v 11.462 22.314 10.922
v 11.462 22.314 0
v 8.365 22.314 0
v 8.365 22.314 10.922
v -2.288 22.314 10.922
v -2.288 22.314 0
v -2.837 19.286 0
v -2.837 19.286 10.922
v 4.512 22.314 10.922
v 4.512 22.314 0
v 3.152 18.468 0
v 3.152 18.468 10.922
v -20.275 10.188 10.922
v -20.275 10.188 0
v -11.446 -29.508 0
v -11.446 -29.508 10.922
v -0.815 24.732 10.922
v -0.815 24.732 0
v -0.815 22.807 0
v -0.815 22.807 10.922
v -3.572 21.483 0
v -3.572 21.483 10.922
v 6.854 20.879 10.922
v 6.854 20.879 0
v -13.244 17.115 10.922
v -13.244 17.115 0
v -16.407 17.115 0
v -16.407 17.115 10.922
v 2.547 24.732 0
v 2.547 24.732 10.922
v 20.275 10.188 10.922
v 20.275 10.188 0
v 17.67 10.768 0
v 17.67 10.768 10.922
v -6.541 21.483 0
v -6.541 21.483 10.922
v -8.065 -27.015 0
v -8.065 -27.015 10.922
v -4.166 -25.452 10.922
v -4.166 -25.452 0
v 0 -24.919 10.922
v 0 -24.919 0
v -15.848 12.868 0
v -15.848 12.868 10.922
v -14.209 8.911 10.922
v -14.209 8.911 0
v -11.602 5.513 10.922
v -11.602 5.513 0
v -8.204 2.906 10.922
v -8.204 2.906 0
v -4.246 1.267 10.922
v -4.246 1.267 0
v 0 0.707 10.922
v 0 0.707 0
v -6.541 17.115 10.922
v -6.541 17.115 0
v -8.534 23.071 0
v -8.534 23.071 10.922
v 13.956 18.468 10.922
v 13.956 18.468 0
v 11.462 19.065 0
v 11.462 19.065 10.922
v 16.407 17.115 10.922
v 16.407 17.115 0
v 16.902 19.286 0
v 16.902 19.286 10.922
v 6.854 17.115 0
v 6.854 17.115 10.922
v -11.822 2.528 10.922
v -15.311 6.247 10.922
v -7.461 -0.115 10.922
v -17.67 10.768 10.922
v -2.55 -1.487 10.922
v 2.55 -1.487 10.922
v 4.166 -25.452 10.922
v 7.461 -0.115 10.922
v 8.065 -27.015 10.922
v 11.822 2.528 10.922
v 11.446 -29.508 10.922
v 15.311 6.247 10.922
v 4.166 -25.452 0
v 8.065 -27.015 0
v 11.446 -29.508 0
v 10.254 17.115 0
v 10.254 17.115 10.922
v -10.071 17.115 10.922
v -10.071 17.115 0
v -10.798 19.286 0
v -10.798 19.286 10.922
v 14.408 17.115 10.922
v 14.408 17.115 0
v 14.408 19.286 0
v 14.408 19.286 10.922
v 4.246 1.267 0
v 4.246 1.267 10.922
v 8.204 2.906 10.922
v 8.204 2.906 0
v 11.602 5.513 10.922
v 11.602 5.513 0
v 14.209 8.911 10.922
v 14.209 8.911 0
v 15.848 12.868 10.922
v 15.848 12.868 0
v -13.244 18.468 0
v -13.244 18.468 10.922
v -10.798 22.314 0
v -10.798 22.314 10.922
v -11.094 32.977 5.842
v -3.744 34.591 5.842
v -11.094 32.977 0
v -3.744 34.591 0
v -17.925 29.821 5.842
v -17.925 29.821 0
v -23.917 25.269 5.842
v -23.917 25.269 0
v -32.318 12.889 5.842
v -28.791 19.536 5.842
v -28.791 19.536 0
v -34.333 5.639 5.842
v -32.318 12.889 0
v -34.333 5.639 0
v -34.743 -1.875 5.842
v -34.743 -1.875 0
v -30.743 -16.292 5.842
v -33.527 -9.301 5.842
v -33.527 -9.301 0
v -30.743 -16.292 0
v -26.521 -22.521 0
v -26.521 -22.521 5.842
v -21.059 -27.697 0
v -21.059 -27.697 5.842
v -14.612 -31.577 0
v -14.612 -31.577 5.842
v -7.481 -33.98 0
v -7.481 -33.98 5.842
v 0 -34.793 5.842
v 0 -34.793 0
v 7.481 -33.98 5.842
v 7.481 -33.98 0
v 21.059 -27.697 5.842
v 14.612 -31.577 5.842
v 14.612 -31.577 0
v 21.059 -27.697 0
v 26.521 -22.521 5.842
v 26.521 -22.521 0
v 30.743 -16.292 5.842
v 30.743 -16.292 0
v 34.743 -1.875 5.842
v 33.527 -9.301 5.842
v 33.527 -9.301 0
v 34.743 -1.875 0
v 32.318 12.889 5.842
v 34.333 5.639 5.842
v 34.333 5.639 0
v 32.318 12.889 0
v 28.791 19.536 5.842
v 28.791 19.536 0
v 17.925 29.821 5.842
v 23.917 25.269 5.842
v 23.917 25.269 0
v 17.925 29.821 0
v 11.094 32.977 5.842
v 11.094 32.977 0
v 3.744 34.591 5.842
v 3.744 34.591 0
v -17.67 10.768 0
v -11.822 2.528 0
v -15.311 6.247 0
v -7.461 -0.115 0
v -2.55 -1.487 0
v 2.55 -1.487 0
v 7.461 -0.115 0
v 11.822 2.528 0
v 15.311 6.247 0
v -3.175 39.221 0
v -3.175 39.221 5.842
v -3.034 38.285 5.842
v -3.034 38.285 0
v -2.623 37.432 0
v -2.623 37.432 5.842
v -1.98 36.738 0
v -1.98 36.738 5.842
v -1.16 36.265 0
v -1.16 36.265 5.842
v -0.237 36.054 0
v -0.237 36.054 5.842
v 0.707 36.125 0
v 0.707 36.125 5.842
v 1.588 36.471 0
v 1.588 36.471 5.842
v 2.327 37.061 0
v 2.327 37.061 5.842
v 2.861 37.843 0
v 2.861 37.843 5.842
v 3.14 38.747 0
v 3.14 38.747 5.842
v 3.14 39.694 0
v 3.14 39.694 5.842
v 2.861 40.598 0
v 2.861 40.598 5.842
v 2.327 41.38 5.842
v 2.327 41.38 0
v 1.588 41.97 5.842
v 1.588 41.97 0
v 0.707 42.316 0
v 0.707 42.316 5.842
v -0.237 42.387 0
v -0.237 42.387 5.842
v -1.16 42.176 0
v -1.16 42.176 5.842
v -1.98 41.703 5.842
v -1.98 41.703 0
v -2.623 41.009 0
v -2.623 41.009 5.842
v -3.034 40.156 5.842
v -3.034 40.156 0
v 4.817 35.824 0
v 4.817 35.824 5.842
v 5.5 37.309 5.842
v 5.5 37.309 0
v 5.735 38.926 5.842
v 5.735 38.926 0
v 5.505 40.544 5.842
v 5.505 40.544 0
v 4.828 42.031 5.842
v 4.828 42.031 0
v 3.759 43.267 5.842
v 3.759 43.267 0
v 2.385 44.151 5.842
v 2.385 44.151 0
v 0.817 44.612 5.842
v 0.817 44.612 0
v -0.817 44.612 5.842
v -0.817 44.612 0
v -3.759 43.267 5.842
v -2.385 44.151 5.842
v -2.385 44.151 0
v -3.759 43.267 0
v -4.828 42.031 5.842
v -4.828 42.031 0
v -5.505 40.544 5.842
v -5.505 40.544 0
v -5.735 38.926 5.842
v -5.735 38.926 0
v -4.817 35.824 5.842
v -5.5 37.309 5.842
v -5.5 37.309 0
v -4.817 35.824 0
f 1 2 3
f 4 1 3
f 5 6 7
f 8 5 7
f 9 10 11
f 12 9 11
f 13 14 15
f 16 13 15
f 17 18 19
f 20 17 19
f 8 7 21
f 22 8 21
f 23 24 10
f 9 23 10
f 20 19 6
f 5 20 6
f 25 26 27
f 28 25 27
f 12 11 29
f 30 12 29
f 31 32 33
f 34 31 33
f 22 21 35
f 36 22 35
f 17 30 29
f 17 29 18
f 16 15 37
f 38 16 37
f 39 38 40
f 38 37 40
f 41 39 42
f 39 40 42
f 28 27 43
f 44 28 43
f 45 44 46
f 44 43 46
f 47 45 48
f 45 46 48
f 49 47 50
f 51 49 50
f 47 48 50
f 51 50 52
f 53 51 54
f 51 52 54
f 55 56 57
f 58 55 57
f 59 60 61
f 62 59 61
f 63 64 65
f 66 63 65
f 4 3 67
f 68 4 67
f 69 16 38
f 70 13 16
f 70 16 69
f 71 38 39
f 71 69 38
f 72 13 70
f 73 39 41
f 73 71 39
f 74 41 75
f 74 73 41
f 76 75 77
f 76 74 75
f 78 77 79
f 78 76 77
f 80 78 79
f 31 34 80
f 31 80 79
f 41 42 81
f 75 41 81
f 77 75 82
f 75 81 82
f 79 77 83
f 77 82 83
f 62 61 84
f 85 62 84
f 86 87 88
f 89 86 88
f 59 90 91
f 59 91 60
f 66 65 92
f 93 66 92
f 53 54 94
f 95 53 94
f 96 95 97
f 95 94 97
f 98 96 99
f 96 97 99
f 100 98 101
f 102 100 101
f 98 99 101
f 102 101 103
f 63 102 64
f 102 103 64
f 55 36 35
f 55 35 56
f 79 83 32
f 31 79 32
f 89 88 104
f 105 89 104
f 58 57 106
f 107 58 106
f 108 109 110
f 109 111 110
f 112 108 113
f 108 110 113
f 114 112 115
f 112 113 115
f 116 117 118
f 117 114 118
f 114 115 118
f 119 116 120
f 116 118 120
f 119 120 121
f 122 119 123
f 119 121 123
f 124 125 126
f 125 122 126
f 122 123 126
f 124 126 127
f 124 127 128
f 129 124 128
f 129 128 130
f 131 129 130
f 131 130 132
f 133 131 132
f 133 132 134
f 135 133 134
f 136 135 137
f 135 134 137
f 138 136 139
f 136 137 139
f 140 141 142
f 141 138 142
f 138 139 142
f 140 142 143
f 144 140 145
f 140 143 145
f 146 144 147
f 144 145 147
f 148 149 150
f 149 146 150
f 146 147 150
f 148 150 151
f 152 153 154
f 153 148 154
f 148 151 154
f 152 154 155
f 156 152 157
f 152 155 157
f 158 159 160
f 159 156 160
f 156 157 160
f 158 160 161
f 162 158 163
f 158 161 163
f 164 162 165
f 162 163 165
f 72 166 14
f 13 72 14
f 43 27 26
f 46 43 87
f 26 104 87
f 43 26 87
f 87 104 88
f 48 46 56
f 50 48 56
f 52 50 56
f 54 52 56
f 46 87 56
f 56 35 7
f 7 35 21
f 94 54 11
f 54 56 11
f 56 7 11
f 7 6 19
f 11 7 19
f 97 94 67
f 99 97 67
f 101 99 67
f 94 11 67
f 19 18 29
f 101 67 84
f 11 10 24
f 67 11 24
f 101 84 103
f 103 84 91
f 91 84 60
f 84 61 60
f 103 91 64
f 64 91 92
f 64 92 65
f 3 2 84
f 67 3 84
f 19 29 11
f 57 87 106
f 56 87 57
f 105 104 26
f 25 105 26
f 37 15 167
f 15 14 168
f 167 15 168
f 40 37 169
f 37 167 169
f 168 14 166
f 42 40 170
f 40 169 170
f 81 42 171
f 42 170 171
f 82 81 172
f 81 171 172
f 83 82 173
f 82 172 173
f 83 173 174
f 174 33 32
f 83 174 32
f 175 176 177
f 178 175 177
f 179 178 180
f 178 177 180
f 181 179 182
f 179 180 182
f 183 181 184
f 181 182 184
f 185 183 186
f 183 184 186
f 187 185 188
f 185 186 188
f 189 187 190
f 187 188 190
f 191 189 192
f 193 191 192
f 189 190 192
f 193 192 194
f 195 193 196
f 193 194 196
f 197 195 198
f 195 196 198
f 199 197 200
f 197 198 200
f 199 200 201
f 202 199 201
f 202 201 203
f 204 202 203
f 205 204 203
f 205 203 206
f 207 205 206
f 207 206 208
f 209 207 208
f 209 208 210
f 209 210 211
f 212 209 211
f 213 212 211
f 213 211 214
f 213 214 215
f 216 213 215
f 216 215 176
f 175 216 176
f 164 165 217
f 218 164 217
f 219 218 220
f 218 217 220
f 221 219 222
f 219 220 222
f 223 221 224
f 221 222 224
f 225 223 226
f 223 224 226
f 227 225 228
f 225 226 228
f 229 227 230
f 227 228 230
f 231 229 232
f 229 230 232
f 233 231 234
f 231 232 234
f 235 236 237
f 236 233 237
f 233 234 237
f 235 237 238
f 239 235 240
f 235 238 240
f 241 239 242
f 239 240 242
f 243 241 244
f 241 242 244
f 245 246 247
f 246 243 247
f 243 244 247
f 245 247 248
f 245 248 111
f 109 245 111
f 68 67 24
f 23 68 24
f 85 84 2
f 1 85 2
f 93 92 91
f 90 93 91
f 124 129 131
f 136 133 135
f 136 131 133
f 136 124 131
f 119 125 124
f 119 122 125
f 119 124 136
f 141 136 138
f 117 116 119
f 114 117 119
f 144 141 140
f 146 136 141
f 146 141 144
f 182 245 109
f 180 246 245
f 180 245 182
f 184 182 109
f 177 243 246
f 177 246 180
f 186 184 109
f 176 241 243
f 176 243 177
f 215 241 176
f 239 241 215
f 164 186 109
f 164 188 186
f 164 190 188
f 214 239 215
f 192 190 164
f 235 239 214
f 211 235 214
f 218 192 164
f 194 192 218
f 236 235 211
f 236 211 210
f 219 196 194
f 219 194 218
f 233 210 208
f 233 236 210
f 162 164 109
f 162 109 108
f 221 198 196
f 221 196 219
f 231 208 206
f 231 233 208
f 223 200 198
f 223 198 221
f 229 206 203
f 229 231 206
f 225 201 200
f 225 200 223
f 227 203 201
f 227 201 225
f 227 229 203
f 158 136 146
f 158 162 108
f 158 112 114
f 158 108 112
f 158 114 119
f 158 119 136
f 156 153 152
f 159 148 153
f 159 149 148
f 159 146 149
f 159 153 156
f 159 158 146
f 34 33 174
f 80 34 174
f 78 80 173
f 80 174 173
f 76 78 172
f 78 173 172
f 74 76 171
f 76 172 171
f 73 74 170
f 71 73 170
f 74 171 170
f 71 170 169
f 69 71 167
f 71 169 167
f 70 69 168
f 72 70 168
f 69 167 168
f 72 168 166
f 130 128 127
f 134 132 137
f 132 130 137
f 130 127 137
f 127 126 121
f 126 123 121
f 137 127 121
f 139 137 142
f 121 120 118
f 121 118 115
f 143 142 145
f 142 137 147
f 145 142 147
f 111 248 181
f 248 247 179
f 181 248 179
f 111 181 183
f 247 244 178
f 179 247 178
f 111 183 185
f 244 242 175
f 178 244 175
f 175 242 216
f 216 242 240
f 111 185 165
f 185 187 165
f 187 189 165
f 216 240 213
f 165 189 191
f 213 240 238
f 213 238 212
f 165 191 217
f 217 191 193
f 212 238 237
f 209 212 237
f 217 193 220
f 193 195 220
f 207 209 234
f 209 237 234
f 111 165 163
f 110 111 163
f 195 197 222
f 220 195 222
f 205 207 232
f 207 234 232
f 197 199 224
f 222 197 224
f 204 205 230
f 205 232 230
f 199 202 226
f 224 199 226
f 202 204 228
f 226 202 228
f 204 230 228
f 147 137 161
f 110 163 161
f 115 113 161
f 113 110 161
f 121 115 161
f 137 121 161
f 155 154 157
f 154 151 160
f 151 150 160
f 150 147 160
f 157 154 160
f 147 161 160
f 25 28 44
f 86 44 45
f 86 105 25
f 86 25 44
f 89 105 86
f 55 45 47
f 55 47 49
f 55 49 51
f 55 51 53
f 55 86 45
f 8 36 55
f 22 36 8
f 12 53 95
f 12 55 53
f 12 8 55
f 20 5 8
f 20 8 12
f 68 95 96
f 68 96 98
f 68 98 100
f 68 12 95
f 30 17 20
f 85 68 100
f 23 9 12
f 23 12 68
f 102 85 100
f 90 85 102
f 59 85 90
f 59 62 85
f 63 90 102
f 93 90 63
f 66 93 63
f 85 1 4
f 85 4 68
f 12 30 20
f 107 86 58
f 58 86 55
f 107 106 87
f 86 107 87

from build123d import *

# Parameters (mm, degrees)
F1_DEPTH = 10.922
F2_R     = 34.7934132073
F3_DEPTH = 5.842
F4_R     = 5.7350404731
F6_DEPTH = 5.842
F8_D     = 6.35


with BuildPart() as f1:
    # F0 (on Top) → F1 (new body)
    with BuildSketch(Plane.XY):
        with BuildLine():
            ThreePointArc((-16.4070340013, 17.1145107597), (-11.6015250015, 5.5129857582), (0, 0.7074767584))
            ThreePointArc((0, 0.7074767584), (11.6015250015, 5.5129857582), (16.4070340013, 17.1145107597))
            Line((16.4070340013, 17.1145107597), (16.9020351022, 19.2860950854))
            Line((16.9020351022, 19.2860950854), (14.4083536053, 19.2860950854))
            Line((14.4083536053, 19.2860950854), (14.4083536053, 17.1145107597))
            Line((14.4083536053, 17.1145107597), (13.9555670321, 18.4676581994))
            Line((13.9555670321, 18.4676581994), (11.462399736, 19.0653000027))
            Line((11.462399736, 19.0653000027), (10.2535923943, 17.1145107597))
            Line((10.2535923943, 17.1145107597), (11.462399736, 22.3139729351))
            Line((11.462399736, 22.3139729351), (8.3648301661, 22.3139729351))
            Line((8.3648301661, 22.3139729351), (6.8538202904, 17.1145107597))
            Line((6.8538202904, 17.1145107597), (6.8538202904, 20.8785124123))
            Line((6.8538202904, 20.8785124123), (4.5117558911, 22.3139729351))
            Line((4.5117558911, 22.3139729351), (3.1518468168, 18.4676581994))
            Line((3.1518468168, 18.4676581994), (2.5474431459, 24.7315876186))
            Line((2.5474431459, 24.7315876186), (-0.8149922269, 24.7315876186))
            Line((-0.8149922269, 24.7315876186), (-0.8149922269, 22.8067958634))
            Line((-0.8149922269, 22.8067958634), (-2.2877878509, 22.3139729351))
            Line((-2.2877878509, 22.3139729351), (-2.8370516593, 19.2860950854))
            Line((-2.8370516593, 19.2860950854), (-3.5721461754, 21.4829165488))
            Line((-3.5721461754, 21.4829165488), (-6.5408538743, 21.4829165488))
            Line((-6.5408538743, 21.4829165488), (-6.5408538743, 17.1145107597))
            Line((-6.5408538743, 17.1145107597), (-8.5341380016, 23.0714173309))
            Line((-8.5341380016, 23.0714173309), (-10.7977518222, 22.3139729351))
            Line((-10.7977518222, 22.3139729351), (-10.0711020896, 17.1145107597))
            Line((-10.0711020896, 17.1145107597), (-10.7977518222, 19.2860950854))
            Line((-10.7977518222, 19.2860950854), (-13.2436409947, 18.4676581994))
            Line((-13.2436409947, 18.4676581994), (-13.2436409947, 17.1145107597))
            Line((-13.2436409947, 17.1145107597), (-16.4070340013, 17.1145107597))
        make_face()
    extrude(amount=F1_DEPTH)


with BuildPart() as f1b:
    # F0 (on Top) → F1, piece 2 (new body)
    with BuildSketch(Plane.XY):
        with BuildLine():
            ThreePointArc((0, -24.9193525969), (6.1655275867, -26.1091748948), (11.4455844786, -29.5077638287))
            Line((11.4455844786, -29.5077638287), (20.2754288912, 10.1880393922))
            Line((20.2754288912, 10.1880393922), (17.6701849203, 10.7675439507))
            ThreePointArc((17.6701849203, 10.7675439507), (10.8016652341, 1.7573153464), (0, -1.6609898406))
            ThreePointArc((0, -1.6609898406), (-10.8016652341, 1.7573153464), (-17.6701849203, 10.7675439507))
            Line((-17.6701849203, 10.7675439507), (-20.2754288912, 10.1880393922))
            Line((-20.2754288912, 10.1880393922), (-11.4455844786, -29.5077638287))
            ThreePointArc((-11.4455844786, -29.5077638287), (-6.1655275867, -26.1091748948), (0, -24.9193525969))
        make_face()
    extrude(amount=F1_DEPTH)


with BuildPart() as f3:
    # F2 (on Top) → F3 (new body)
    with BuildSketch(Plane.XY):
        Circle(F2_R)
    extrude(amount=F3_DEPTH)

    # F4 (on Top) → F6 (join)
    with BuildSketch(Plane.XY):
        with Locations((0, 38.9353483915)):
            Circle(F4_R)
    extrude(amount=F6_DEPTH)

    # F8 (through all)
    with Locations(Plane(origin=(0, 0, 0), x_dir=(1, 0, 0), z_dir=(0, 0, -1))):
        with Locations((0, -39.2205901444)):
            Hole(F8_D / 2)


solid = Compound([f1.part, f1b.part, f3.part])
